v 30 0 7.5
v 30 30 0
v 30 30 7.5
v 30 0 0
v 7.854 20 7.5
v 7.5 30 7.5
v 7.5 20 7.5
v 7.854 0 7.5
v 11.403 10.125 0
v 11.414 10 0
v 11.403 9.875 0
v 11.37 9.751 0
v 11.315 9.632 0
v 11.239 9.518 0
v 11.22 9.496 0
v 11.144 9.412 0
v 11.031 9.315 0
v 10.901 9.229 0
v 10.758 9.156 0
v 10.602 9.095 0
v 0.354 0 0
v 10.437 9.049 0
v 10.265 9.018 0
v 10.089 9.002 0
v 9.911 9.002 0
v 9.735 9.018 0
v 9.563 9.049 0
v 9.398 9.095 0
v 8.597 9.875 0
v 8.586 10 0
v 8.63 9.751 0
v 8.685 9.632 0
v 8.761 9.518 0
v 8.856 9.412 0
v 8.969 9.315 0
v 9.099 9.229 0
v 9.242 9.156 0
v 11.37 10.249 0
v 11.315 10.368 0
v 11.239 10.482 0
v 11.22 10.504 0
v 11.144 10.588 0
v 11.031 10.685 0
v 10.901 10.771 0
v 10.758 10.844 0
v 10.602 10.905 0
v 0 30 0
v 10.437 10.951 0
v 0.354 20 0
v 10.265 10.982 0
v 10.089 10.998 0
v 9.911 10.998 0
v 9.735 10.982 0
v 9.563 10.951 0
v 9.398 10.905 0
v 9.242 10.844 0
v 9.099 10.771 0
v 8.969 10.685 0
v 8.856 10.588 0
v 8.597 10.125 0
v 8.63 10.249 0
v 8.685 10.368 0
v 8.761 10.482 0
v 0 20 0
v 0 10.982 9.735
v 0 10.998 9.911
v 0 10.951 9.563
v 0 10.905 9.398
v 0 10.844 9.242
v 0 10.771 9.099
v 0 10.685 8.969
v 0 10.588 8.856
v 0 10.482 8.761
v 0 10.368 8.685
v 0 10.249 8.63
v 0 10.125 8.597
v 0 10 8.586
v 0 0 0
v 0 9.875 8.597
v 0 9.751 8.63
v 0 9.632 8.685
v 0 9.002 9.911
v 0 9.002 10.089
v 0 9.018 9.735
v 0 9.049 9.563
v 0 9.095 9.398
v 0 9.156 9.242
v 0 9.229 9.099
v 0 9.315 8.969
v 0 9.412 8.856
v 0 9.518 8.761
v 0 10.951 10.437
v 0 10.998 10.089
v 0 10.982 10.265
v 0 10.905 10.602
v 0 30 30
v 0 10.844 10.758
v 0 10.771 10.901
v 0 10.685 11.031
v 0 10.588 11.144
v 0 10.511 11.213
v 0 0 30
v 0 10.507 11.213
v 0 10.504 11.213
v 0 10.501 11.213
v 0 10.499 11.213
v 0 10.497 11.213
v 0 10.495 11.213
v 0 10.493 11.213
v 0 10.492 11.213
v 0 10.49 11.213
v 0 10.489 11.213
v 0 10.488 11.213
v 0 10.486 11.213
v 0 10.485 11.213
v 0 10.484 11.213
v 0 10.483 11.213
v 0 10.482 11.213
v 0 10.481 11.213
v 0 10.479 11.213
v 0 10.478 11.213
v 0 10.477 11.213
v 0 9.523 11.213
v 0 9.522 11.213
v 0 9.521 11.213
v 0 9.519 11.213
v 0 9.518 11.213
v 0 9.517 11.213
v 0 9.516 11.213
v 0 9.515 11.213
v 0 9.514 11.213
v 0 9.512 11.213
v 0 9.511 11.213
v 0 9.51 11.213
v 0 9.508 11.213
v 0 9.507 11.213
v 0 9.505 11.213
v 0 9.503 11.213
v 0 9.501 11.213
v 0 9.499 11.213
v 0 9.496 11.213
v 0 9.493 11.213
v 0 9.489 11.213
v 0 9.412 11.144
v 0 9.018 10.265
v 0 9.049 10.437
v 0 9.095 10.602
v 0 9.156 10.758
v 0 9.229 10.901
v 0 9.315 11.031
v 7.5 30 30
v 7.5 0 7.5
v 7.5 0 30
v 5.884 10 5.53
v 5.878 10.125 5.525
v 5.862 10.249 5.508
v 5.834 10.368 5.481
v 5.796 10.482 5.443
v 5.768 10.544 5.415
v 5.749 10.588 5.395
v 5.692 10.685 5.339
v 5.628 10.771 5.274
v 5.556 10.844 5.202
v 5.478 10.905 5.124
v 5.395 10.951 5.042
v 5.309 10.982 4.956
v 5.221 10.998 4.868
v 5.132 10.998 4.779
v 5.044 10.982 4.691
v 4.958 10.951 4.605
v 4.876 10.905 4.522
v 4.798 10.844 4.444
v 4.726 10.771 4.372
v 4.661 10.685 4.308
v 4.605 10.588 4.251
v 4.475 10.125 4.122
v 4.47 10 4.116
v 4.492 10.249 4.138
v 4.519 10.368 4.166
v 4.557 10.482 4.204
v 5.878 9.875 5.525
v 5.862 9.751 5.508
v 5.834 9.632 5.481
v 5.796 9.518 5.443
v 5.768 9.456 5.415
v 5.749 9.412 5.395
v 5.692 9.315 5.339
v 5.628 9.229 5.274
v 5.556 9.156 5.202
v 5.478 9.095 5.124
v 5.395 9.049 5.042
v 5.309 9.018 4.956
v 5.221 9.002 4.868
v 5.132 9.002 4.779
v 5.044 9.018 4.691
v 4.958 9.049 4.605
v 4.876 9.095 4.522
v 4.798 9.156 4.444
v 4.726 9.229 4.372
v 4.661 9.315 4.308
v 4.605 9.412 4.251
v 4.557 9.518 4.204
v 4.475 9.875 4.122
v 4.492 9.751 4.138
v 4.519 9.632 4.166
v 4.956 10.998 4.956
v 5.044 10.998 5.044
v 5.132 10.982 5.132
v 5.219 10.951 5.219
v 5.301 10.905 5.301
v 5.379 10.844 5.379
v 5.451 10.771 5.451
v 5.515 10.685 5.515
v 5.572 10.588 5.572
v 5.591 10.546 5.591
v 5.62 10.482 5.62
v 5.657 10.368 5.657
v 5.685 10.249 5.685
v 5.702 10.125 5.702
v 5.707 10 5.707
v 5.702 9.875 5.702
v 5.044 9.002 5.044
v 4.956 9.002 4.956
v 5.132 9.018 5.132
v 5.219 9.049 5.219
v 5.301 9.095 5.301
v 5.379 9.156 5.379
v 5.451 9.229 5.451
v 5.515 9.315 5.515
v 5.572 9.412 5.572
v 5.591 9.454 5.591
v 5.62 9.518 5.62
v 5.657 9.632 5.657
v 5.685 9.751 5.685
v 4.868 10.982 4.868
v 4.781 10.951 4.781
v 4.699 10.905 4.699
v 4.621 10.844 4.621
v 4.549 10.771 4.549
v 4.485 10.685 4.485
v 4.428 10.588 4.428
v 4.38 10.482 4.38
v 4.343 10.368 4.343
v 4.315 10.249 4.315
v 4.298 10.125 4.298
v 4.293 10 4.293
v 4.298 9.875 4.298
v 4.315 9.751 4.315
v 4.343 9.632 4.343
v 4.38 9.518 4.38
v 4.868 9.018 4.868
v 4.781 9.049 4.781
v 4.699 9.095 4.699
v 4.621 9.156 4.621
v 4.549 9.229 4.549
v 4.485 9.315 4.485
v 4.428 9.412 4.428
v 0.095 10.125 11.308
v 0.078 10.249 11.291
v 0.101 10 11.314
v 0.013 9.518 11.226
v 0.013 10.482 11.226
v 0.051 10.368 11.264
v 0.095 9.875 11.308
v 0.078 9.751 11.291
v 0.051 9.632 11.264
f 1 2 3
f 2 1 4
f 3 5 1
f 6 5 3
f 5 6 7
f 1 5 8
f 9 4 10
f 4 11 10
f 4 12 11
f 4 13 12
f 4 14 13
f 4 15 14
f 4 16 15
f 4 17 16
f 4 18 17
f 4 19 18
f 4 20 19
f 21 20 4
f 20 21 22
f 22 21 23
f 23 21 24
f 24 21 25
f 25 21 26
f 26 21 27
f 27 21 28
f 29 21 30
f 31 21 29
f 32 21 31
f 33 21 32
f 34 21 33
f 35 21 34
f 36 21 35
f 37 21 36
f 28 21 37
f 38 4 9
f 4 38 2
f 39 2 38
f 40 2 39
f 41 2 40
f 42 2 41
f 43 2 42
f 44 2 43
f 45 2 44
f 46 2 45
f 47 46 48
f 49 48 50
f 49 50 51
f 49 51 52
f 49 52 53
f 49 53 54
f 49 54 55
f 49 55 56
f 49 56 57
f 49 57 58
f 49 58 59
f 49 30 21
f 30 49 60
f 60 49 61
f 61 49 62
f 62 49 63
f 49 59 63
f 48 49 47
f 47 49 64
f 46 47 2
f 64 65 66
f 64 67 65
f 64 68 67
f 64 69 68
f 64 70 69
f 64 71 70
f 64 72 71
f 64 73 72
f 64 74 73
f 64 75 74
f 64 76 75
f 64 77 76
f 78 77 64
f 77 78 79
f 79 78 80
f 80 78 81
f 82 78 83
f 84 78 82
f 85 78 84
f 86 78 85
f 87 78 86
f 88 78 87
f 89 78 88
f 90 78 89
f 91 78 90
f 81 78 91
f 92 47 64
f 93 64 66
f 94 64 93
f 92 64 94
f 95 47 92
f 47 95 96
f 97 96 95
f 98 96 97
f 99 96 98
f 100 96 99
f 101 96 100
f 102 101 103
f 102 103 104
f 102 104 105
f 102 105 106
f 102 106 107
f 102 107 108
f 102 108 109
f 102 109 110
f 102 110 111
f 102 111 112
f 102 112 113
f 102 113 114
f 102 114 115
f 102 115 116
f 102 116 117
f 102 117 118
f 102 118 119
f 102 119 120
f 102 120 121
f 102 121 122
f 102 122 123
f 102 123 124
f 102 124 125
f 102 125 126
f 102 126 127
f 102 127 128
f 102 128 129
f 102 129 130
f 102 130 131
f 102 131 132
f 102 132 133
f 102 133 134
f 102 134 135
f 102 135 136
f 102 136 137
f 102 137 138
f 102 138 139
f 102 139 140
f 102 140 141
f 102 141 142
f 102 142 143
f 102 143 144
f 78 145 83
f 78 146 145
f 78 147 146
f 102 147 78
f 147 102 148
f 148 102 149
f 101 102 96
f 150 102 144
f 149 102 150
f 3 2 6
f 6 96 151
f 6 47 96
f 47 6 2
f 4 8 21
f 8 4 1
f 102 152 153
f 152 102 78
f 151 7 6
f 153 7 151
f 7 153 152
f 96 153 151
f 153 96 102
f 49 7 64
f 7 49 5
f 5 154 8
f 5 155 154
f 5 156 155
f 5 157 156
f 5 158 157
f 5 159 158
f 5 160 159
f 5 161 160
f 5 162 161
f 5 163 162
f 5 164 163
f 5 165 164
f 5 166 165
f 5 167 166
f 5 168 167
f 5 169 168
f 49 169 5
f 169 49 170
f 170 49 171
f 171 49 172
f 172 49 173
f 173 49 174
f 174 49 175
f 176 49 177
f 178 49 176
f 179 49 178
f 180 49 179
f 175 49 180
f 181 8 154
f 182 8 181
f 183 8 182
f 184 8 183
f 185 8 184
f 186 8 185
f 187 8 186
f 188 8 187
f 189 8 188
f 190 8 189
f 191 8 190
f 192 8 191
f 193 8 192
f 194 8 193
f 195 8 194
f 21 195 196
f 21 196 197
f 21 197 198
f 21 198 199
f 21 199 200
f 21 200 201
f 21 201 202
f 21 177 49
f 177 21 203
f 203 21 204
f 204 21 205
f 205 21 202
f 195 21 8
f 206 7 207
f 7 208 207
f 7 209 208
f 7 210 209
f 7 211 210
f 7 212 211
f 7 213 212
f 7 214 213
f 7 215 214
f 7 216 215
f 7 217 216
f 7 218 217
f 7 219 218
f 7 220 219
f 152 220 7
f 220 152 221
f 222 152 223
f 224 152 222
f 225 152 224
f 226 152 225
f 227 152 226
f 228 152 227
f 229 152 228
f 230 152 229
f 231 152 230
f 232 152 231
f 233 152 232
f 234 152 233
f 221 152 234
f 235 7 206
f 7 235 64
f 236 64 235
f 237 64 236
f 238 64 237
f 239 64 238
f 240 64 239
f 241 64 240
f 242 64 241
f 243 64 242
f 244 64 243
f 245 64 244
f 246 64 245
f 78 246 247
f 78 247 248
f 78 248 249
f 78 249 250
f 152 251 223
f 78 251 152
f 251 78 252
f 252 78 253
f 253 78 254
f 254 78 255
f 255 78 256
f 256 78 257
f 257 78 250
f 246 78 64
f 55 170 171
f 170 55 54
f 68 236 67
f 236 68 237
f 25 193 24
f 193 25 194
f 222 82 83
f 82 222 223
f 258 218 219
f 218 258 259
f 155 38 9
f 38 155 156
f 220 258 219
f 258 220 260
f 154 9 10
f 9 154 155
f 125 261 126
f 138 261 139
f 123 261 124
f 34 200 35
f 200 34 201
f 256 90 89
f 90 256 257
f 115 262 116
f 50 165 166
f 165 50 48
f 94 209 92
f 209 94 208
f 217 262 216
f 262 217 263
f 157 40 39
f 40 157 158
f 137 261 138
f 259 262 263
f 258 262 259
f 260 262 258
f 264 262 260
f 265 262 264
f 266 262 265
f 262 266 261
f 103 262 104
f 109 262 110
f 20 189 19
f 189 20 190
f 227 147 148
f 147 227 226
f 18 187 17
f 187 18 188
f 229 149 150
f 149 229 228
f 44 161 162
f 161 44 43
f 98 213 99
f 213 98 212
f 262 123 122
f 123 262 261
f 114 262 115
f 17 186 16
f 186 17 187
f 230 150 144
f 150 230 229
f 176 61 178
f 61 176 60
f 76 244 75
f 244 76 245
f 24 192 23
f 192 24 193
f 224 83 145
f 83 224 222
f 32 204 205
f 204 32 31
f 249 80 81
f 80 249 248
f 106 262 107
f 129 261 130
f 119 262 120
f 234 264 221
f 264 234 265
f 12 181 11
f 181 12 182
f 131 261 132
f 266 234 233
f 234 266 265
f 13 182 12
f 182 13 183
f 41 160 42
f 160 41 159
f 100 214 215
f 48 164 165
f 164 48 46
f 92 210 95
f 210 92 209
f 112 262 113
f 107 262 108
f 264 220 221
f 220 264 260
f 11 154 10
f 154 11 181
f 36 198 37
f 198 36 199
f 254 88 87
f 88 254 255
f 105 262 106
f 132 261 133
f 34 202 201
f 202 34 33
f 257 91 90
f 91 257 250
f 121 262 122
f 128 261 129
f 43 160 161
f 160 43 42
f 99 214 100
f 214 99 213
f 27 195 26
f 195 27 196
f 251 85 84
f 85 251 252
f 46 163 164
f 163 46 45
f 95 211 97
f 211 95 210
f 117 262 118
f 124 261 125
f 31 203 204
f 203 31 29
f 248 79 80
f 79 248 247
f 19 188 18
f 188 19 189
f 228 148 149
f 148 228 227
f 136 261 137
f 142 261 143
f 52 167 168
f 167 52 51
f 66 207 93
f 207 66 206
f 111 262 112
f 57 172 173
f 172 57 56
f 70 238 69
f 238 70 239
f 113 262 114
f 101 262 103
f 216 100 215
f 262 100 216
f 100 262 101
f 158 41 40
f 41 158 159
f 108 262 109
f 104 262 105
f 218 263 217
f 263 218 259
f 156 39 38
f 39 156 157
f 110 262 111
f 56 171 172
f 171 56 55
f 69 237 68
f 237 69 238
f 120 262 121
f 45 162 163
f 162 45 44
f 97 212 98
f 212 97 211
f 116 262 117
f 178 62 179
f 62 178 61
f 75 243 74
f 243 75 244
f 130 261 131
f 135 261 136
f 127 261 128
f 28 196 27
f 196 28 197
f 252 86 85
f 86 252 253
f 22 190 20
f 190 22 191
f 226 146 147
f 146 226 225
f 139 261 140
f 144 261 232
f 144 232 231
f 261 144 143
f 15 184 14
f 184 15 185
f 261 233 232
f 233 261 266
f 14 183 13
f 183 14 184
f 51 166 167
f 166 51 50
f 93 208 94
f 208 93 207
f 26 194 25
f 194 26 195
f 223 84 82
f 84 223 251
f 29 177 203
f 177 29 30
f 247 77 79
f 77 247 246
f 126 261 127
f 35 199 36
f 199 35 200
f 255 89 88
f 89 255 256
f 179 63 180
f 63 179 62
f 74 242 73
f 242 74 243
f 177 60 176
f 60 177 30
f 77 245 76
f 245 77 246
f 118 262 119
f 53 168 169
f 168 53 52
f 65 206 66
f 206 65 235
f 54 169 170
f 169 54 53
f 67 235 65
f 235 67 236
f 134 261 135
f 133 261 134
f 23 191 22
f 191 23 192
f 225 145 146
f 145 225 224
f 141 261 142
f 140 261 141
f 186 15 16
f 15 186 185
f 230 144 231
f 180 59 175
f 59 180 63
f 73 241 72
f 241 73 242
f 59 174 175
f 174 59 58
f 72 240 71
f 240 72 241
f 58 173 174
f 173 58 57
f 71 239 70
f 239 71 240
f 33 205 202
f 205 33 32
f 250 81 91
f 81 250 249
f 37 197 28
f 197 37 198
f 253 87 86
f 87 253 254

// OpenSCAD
$fn=50;
q=30;
z=4;

difference() {
    union() {
        cube([q,q,q/z]);
        cube([q/z,q,q]);
    }
    rotate([0,45,0]) #cube([.25,20,20]);
    translate([10,10,0]) rotate([0,-45,0]) translate([0,0,-5]) #cylinder(20,d=2);
}
